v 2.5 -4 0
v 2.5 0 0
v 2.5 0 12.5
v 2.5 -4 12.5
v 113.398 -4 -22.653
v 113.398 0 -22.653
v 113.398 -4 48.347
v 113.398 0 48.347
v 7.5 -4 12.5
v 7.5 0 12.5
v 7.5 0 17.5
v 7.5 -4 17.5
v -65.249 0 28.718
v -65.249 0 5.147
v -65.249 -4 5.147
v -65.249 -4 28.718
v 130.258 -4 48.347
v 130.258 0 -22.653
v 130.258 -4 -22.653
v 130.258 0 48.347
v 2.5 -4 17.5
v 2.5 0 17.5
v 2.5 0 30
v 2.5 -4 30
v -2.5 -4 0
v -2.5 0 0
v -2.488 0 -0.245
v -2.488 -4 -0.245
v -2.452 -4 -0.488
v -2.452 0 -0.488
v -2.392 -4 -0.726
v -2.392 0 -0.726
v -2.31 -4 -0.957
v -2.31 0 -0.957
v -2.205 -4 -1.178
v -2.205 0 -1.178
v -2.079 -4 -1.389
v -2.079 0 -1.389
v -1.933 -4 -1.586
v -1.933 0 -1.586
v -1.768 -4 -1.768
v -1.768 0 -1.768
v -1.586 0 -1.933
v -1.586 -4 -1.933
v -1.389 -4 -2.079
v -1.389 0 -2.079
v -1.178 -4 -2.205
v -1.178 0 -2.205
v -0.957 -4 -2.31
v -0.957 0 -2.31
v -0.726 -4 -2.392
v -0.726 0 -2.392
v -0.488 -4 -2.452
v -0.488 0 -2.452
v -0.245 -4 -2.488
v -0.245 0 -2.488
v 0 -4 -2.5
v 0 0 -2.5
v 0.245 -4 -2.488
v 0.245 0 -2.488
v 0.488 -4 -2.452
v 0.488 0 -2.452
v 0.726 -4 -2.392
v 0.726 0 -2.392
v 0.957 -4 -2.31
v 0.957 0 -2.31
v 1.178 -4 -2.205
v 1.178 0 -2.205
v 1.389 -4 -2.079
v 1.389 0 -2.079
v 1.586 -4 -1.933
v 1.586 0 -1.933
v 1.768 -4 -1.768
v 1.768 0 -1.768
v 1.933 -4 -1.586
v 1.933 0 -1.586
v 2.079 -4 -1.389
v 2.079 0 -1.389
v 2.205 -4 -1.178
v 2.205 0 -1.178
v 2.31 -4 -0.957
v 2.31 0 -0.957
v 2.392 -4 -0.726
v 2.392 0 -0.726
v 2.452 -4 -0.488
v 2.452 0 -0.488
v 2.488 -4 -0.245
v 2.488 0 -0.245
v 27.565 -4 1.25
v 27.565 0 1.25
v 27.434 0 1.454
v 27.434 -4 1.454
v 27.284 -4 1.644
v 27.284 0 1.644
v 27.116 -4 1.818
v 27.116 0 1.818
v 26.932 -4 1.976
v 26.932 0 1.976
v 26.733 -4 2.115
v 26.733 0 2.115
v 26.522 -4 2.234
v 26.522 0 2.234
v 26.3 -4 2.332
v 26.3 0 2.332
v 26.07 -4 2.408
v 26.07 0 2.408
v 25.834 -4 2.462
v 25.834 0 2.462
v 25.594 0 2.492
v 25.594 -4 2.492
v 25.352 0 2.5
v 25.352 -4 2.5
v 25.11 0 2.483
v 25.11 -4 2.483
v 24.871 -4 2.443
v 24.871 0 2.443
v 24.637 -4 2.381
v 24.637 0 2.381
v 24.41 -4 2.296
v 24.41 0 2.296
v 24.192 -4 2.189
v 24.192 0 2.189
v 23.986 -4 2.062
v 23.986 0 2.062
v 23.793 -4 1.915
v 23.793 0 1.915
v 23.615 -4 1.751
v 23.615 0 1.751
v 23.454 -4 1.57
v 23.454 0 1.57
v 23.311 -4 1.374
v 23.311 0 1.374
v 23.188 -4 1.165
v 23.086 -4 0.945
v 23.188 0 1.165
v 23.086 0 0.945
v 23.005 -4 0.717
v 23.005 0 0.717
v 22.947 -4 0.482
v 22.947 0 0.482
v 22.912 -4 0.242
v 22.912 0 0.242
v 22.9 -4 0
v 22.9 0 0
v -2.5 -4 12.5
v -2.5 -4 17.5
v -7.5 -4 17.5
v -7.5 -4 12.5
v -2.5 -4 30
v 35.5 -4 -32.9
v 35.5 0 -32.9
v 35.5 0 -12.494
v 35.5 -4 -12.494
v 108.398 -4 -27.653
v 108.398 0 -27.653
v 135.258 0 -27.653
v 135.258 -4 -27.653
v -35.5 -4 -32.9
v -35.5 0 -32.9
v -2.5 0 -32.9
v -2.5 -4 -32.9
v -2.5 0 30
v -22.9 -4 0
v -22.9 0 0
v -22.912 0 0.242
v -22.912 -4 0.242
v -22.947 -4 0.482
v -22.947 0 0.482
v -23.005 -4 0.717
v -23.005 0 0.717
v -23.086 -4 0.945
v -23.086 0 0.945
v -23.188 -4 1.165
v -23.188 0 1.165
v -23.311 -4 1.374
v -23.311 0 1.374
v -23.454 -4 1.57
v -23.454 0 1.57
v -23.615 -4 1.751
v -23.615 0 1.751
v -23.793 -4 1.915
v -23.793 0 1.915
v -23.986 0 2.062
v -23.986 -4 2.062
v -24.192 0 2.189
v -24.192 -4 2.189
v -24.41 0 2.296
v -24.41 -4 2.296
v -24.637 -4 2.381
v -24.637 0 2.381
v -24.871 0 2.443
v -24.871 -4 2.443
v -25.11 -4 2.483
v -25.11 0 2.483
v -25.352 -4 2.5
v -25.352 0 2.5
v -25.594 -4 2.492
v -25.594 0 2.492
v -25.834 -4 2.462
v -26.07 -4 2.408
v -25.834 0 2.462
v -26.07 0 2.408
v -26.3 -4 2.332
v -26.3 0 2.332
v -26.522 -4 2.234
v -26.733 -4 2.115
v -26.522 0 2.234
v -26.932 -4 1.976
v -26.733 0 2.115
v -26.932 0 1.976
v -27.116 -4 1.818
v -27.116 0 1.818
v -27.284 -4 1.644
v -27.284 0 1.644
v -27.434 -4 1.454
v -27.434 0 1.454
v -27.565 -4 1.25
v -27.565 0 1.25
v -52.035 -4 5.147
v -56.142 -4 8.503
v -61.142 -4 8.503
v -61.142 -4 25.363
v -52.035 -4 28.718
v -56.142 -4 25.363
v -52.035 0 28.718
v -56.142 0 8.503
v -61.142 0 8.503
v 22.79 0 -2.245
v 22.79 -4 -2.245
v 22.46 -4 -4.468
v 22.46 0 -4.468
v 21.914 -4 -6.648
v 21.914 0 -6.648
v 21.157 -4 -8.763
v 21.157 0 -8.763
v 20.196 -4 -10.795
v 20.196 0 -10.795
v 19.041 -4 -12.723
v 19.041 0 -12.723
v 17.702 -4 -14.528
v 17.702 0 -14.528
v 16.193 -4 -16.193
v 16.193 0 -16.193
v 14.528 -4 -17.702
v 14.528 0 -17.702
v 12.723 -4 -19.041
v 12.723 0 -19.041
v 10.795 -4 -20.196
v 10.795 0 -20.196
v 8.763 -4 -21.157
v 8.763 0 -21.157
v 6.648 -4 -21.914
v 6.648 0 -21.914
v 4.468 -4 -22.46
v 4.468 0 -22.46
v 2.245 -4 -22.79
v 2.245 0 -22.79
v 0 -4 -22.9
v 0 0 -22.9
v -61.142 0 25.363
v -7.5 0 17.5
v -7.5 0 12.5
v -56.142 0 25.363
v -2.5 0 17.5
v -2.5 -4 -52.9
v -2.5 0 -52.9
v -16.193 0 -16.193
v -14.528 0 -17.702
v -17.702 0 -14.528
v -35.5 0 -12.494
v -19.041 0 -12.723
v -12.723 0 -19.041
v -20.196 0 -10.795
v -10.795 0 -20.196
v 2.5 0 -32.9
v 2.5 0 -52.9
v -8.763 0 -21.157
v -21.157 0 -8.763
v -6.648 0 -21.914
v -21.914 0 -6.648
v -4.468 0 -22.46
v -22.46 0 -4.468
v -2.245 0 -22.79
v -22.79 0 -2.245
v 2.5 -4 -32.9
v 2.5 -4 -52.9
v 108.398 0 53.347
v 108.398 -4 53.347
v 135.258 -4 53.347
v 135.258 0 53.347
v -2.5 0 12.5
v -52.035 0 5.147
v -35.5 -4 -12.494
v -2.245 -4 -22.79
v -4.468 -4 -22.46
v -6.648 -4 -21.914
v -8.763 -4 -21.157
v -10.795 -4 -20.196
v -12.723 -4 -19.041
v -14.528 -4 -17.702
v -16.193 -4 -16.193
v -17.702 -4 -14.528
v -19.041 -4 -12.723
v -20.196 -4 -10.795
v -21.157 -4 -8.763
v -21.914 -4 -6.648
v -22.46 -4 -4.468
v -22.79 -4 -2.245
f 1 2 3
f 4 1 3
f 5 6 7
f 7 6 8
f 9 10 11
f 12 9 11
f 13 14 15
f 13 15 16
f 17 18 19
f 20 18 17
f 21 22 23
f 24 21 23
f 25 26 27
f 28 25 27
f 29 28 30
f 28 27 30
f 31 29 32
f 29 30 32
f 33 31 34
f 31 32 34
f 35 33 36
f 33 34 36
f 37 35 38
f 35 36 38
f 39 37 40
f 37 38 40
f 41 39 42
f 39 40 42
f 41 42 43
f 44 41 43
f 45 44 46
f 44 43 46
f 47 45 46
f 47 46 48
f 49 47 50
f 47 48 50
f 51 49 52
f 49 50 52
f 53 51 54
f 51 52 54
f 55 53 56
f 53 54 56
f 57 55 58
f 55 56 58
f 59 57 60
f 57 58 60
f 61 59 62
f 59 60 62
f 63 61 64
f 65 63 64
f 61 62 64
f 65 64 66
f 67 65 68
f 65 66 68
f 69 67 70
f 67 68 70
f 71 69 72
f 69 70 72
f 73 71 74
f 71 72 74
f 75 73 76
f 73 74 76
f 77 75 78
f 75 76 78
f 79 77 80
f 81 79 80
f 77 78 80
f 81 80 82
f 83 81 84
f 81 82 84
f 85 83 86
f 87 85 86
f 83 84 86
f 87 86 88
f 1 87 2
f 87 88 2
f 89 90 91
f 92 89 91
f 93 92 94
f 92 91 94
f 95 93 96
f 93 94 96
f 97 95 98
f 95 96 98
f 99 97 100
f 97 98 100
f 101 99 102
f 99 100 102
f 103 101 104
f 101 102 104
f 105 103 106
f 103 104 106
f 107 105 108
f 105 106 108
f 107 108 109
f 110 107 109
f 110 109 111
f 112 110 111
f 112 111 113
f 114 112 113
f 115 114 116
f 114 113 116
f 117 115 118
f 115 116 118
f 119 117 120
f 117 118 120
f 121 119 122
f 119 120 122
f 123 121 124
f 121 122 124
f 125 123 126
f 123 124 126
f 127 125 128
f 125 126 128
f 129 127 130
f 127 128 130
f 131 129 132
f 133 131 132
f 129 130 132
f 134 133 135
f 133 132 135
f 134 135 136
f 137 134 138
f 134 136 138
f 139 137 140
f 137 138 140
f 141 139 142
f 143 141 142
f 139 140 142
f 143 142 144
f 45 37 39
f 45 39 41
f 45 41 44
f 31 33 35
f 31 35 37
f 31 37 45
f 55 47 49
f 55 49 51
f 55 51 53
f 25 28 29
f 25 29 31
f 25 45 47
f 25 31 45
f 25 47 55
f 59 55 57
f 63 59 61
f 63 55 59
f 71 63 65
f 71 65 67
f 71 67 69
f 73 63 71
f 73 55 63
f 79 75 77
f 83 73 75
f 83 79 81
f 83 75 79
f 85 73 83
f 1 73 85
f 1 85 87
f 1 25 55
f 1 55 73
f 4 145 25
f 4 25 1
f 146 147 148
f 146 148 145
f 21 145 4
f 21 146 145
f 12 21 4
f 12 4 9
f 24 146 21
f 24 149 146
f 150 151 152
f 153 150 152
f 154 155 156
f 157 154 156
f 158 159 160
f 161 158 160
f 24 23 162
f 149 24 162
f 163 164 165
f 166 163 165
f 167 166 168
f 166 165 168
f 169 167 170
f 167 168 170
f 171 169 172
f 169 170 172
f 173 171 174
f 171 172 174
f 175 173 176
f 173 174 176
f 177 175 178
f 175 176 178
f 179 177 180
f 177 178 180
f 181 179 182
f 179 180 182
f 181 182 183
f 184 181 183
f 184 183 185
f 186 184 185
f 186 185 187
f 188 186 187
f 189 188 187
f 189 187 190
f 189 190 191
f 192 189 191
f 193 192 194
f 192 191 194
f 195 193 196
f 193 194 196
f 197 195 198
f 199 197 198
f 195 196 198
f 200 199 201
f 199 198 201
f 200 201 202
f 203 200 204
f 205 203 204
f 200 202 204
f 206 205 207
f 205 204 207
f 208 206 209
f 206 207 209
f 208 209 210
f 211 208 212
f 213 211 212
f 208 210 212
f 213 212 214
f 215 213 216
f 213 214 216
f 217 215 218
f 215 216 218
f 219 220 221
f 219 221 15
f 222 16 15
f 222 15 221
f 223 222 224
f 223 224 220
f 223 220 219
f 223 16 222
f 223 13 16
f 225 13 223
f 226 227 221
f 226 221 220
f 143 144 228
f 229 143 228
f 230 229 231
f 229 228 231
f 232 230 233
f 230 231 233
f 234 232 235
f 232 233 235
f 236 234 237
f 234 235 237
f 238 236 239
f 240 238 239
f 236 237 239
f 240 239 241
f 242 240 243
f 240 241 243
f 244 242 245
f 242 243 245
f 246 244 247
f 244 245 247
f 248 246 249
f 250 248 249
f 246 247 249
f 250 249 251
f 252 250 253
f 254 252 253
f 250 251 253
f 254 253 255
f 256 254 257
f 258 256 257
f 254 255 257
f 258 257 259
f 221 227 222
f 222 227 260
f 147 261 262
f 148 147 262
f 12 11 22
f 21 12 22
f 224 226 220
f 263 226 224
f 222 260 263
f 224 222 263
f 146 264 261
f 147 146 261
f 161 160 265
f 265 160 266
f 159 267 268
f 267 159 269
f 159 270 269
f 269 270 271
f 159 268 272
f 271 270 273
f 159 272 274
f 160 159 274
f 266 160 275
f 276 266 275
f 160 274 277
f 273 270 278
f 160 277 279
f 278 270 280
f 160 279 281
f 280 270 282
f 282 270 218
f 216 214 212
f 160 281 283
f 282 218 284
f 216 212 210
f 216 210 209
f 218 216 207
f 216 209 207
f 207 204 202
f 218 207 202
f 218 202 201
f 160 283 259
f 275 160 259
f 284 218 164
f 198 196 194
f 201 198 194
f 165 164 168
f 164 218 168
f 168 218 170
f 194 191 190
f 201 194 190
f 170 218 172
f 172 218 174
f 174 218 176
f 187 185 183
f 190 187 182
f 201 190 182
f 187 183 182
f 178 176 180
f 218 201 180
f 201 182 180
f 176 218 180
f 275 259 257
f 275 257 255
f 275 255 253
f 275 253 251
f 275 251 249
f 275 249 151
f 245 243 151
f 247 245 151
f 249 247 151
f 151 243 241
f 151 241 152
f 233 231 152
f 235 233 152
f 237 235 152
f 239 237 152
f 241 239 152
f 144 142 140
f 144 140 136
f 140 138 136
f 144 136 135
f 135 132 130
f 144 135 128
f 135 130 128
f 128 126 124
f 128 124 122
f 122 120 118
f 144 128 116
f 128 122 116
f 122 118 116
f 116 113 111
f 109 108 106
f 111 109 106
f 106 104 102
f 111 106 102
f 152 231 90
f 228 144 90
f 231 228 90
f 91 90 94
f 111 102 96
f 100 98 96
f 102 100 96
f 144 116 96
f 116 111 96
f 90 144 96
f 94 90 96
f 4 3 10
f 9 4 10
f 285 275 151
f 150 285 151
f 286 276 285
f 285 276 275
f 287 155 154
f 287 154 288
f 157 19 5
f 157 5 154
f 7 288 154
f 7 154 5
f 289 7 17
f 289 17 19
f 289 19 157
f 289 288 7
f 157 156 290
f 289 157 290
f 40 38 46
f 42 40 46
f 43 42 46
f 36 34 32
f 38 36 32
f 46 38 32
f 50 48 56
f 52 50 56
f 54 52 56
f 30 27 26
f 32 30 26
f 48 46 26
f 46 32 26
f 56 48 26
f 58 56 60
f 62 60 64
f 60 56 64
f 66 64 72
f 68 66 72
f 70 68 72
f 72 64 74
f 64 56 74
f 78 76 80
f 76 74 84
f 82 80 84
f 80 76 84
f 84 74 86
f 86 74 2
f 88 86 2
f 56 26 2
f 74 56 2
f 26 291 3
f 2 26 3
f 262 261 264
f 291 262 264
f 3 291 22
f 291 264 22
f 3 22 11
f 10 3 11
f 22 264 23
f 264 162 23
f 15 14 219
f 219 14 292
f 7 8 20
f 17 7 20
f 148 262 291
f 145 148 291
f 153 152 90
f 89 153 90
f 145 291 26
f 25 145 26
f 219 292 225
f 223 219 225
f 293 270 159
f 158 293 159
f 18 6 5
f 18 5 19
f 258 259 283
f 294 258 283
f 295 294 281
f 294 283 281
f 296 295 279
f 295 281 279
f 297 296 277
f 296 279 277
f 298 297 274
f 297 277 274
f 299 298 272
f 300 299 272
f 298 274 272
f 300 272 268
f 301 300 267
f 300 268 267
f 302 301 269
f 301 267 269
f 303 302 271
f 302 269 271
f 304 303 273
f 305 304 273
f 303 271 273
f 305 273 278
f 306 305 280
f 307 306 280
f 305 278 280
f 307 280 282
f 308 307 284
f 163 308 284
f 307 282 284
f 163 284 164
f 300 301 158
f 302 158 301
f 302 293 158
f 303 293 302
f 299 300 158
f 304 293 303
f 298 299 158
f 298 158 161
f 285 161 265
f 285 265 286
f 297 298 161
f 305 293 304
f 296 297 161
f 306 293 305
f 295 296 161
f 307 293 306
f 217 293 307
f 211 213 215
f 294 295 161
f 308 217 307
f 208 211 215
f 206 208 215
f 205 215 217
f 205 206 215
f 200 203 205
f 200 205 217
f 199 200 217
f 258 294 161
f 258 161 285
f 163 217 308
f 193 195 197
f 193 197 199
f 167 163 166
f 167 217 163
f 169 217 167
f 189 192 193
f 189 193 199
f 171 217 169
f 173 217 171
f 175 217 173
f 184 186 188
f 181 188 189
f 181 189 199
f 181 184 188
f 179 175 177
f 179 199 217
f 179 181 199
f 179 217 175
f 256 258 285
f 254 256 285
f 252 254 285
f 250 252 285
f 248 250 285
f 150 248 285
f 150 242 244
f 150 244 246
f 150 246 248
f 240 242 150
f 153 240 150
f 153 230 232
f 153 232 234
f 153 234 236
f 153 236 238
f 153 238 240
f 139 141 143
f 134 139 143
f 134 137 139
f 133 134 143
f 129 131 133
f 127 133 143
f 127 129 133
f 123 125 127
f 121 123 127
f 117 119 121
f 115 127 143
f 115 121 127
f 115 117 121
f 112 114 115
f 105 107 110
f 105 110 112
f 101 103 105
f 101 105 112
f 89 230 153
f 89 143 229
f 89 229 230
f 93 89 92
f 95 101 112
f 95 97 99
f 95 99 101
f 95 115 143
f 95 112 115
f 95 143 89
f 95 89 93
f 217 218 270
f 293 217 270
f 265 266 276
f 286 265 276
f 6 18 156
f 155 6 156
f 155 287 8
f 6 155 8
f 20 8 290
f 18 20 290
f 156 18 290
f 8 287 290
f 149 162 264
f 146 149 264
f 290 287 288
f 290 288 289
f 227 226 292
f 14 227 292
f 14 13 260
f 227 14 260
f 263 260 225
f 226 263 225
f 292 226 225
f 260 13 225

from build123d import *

# Parameters (mm, degrees)
F1_DEPTH = 4
F2_W     = 13.214283
F2_H     = 23.571432
F2_W_2   = 5
F2_H_2   = 16.86
F2_W_3   = 26.86
F2_H_3   = 81
F2_W_4   = 16.86
F2_H_4   = 71
F3_DEPTH = 4


with BuildPart() as f1:
    # F0 (on Front) → F1 (new body)
    with BuildSketch(Plane.XZ):
        with BuildLine():
            ThreePointArc((0, -22.9), (-16.192745, -16.192745), (-22.9, 0))
            ThreePointArc((-22.9, 0), (-24.752952, 2.414815), (-27.565064, 1.25))
            Line((-27.565064, 1.25), (-35.5, -12.493713))
            Line((-35.5, -12.493713), (-35.5, -32.9))
            Line((-35.5, -32.9), (-2.5, -32.9))
            Line((-2.5, -32.9), (-2.5, -52.9))
            Line((-2.5, -52.9), (2.5, -52.9))
            Line((2.5, -52.9), (2.5, -32.9))
            Line((2.5, -32.9), (35.5, -32.9))
            Line((35.5, -32.9), (35.5, -12.493713))
            Line((35.5, -12.493713), (27.565064, 1.25))
            ThreePointArc((27.565064, 1.25), (24.752952, 2.414815), (22.9, 0))
            ThreePointArc((22.9, 0), (16.192745, -16.192745), (0, -22.9))
        make_face()
        with BuildLine():
            Line((-2.5, 12.5), (-2.5, 0))
            ThreePointArc((-2.5, 0), (0, -2.5), (2.5, 0))
            Line((2.5, 0), (2.5, 12.5))
            Line((2.5, 12.5), (7.5, 12.5))
            Line((7.5, 12.5), (7.5, 17.5))
            Line((7.5, 17.5), (2.5, 17.5))
            Line((2.5, 17.5), (2.5, 30))
            Line((2.5, 30), (-2.5, 30))
            Line((-2.5, 30), (-2.5, 17.5))
            Line((-2.5, 17.5), (-7.5, 17.5))
            Line((-7.5, 17.5), (-7.5, 12.5))
            Line((-7.5, 12.5), (-2.5, 12.5))
        make_face()
    extrude(amount=F1_DEPTH)


with BuildPart() as f3:
    # F2 (on Front) → F3 (new body)
    with BuildSketch(Plane.XZ):
        with Locations((-58.642224, 16.932664)):
            Rectangle(F2_W, F2_H)
        with Locations((-58.642223, 16.932664)):
            Rectangle(F2_W_2, F2_H_2, mode=Mode.SUBTRACT)
        with Locations((121.827655, 12.847362)):
            Rectangle(F2_W_3, F2_H_3)
        with Locations((121.827655, 12.847362)):
            Rectangle(F2_W_4, F2_H_4, mode=Mode.SUBTRACT)
    extrude(amount=F3_DEPTH)


solid = Compound([f1.part, f3.part])
